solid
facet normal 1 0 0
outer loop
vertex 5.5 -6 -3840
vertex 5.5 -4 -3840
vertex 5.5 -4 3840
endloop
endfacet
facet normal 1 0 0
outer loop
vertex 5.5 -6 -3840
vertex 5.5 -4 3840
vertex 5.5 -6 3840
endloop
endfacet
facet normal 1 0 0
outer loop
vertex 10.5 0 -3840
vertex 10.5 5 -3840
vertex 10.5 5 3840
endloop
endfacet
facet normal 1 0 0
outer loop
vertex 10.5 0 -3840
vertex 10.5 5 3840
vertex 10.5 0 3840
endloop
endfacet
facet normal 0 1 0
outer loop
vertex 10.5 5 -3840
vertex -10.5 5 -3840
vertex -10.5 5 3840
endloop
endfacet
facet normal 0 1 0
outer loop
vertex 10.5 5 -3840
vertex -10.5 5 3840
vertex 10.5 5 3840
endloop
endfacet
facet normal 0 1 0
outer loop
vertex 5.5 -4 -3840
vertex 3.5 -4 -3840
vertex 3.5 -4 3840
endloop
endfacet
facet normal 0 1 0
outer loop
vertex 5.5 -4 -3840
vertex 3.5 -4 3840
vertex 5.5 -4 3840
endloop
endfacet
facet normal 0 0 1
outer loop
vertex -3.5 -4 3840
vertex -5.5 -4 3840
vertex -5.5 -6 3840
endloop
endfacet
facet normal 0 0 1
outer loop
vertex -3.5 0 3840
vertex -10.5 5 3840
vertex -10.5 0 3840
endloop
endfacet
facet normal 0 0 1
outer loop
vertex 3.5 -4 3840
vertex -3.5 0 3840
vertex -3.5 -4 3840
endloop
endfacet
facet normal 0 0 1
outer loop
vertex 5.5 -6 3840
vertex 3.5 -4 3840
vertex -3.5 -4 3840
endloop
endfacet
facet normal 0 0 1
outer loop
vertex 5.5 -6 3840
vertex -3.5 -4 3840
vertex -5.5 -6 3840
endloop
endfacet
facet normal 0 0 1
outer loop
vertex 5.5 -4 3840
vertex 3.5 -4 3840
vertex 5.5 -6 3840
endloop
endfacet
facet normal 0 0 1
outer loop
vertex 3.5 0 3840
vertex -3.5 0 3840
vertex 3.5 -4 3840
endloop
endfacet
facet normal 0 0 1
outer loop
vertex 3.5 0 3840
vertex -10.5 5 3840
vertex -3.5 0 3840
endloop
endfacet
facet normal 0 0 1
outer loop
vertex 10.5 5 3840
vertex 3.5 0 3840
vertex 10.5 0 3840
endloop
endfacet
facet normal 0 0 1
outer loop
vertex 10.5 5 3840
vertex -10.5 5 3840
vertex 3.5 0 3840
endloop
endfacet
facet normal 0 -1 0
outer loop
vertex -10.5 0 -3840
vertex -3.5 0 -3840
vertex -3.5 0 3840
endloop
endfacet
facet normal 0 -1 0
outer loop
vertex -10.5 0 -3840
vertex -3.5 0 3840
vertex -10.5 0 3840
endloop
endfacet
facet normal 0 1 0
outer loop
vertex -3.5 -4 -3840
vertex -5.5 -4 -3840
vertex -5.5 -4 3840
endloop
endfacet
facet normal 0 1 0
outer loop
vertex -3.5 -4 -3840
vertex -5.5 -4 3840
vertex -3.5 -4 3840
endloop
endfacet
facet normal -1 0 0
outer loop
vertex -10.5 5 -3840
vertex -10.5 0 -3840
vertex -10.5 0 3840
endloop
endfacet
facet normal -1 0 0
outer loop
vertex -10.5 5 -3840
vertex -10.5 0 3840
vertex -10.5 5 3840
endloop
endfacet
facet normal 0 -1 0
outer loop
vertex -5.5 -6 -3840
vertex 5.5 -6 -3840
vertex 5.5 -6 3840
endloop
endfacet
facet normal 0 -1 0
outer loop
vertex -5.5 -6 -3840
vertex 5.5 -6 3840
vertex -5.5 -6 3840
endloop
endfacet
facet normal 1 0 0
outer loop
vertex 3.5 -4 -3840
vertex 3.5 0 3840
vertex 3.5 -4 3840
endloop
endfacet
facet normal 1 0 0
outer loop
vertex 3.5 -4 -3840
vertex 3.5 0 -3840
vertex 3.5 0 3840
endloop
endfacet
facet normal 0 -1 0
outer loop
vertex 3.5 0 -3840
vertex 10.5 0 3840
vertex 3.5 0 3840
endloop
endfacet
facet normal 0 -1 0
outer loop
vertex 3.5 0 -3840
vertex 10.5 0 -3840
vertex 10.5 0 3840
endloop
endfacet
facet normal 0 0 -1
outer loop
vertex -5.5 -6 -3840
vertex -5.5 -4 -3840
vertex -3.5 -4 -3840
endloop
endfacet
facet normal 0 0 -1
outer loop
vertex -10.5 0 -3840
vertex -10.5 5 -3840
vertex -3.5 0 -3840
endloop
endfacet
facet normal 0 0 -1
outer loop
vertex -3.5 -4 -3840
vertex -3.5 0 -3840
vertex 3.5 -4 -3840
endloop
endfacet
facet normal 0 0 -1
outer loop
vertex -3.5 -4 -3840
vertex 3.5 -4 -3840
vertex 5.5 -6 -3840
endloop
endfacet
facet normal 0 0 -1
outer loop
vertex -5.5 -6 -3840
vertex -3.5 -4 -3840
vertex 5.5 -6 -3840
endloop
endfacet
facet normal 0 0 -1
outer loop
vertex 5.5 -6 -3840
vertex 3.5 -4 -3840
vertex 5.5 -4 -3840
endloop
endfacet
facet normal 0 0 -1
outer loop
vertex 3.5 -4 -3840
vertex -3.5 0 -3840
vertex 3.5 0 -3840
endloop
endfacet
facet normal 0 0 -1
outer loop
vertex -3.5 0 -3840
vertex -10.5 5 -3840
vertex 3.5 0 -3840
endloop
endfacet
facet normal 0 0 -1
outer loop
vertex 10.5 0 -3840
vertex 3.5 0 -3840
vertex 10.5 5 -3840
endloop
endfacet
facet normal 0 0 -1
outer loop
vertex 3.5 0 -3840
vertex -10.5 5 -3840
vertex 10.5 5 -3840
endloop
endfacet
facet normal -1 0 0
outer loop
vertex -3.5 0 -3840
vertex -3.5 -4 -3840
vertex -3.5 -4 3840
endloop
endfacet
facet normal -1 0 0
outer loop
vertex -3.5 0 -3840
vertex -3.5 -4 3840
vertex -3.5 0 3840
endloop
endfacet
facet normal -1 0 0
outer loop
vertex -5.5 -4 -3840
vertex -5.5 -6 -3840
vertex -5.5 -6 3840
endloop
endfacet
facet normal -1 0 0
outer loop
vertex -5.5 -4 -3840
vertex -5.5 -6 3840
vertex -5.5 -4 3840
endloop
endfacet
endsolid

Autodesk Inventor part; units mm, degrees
ref_plane "YZ Plane" through (0, 0, 0) normal (1, 0, 0) x (0, 1, 0)
ref_plane "XZ Plane" through (0, 0, 0) normal (0, 1, 0) x (-1, 0, 0)
ref_plane "XY Plane" through (0, 0, 0) normal (0, 0, 1) x (1, 0, 0)
sketch "스케치9" plane through (0, 0, 0) normal (0, 0, 1) x (1, 0, 0)
  line L0 (-10.5, 5) -> (10.5, 5)
  line L1 (10.5, 5) -> (10.5, 0)
  line L2 (10.5, 0) -> (-10.5, 0)
  line L3 (-10.5, 0) -> (-10.5, 5)
  line L4 (-3.5, 0) -> (3.5, 0)
  line L5 (3.5, 0) -> (3.5, -4)
  line L6 (3.5, -4) -> (-3.5, -4)
  line L7 (-3.5, -4) -> (-3.5, 0)
  line L8 (-5.5, -4) -> (5.5, -4)
  line L9 (5.5, -4) -> (5.5, -6)
  line L10 (5.5, -6) -> (-5.5, -6)
  line L11 (-5.5, -6) -> (-5.5, -4)
  point P0 (0, 0)
  point P1 (0, 0)
  point P2 (0, -4)
  dimension "d40" = 11
  dimension "d41" = 21
  dimension "d42" = 7
  dimension "d43" = 5
  dimension "d44" = 4
  dimension "d45" = 2
extrude "돌출4" add sketch "스케치9" along normal mid plane 7680
equation "\"d46\" = L1 + L2"
equation "\"L1\" = 6000"
equation "\"L2\" = 1680"
properties part number "TL20240701-10100CV-GUIDE RAIL_H-21" material "SS400"
